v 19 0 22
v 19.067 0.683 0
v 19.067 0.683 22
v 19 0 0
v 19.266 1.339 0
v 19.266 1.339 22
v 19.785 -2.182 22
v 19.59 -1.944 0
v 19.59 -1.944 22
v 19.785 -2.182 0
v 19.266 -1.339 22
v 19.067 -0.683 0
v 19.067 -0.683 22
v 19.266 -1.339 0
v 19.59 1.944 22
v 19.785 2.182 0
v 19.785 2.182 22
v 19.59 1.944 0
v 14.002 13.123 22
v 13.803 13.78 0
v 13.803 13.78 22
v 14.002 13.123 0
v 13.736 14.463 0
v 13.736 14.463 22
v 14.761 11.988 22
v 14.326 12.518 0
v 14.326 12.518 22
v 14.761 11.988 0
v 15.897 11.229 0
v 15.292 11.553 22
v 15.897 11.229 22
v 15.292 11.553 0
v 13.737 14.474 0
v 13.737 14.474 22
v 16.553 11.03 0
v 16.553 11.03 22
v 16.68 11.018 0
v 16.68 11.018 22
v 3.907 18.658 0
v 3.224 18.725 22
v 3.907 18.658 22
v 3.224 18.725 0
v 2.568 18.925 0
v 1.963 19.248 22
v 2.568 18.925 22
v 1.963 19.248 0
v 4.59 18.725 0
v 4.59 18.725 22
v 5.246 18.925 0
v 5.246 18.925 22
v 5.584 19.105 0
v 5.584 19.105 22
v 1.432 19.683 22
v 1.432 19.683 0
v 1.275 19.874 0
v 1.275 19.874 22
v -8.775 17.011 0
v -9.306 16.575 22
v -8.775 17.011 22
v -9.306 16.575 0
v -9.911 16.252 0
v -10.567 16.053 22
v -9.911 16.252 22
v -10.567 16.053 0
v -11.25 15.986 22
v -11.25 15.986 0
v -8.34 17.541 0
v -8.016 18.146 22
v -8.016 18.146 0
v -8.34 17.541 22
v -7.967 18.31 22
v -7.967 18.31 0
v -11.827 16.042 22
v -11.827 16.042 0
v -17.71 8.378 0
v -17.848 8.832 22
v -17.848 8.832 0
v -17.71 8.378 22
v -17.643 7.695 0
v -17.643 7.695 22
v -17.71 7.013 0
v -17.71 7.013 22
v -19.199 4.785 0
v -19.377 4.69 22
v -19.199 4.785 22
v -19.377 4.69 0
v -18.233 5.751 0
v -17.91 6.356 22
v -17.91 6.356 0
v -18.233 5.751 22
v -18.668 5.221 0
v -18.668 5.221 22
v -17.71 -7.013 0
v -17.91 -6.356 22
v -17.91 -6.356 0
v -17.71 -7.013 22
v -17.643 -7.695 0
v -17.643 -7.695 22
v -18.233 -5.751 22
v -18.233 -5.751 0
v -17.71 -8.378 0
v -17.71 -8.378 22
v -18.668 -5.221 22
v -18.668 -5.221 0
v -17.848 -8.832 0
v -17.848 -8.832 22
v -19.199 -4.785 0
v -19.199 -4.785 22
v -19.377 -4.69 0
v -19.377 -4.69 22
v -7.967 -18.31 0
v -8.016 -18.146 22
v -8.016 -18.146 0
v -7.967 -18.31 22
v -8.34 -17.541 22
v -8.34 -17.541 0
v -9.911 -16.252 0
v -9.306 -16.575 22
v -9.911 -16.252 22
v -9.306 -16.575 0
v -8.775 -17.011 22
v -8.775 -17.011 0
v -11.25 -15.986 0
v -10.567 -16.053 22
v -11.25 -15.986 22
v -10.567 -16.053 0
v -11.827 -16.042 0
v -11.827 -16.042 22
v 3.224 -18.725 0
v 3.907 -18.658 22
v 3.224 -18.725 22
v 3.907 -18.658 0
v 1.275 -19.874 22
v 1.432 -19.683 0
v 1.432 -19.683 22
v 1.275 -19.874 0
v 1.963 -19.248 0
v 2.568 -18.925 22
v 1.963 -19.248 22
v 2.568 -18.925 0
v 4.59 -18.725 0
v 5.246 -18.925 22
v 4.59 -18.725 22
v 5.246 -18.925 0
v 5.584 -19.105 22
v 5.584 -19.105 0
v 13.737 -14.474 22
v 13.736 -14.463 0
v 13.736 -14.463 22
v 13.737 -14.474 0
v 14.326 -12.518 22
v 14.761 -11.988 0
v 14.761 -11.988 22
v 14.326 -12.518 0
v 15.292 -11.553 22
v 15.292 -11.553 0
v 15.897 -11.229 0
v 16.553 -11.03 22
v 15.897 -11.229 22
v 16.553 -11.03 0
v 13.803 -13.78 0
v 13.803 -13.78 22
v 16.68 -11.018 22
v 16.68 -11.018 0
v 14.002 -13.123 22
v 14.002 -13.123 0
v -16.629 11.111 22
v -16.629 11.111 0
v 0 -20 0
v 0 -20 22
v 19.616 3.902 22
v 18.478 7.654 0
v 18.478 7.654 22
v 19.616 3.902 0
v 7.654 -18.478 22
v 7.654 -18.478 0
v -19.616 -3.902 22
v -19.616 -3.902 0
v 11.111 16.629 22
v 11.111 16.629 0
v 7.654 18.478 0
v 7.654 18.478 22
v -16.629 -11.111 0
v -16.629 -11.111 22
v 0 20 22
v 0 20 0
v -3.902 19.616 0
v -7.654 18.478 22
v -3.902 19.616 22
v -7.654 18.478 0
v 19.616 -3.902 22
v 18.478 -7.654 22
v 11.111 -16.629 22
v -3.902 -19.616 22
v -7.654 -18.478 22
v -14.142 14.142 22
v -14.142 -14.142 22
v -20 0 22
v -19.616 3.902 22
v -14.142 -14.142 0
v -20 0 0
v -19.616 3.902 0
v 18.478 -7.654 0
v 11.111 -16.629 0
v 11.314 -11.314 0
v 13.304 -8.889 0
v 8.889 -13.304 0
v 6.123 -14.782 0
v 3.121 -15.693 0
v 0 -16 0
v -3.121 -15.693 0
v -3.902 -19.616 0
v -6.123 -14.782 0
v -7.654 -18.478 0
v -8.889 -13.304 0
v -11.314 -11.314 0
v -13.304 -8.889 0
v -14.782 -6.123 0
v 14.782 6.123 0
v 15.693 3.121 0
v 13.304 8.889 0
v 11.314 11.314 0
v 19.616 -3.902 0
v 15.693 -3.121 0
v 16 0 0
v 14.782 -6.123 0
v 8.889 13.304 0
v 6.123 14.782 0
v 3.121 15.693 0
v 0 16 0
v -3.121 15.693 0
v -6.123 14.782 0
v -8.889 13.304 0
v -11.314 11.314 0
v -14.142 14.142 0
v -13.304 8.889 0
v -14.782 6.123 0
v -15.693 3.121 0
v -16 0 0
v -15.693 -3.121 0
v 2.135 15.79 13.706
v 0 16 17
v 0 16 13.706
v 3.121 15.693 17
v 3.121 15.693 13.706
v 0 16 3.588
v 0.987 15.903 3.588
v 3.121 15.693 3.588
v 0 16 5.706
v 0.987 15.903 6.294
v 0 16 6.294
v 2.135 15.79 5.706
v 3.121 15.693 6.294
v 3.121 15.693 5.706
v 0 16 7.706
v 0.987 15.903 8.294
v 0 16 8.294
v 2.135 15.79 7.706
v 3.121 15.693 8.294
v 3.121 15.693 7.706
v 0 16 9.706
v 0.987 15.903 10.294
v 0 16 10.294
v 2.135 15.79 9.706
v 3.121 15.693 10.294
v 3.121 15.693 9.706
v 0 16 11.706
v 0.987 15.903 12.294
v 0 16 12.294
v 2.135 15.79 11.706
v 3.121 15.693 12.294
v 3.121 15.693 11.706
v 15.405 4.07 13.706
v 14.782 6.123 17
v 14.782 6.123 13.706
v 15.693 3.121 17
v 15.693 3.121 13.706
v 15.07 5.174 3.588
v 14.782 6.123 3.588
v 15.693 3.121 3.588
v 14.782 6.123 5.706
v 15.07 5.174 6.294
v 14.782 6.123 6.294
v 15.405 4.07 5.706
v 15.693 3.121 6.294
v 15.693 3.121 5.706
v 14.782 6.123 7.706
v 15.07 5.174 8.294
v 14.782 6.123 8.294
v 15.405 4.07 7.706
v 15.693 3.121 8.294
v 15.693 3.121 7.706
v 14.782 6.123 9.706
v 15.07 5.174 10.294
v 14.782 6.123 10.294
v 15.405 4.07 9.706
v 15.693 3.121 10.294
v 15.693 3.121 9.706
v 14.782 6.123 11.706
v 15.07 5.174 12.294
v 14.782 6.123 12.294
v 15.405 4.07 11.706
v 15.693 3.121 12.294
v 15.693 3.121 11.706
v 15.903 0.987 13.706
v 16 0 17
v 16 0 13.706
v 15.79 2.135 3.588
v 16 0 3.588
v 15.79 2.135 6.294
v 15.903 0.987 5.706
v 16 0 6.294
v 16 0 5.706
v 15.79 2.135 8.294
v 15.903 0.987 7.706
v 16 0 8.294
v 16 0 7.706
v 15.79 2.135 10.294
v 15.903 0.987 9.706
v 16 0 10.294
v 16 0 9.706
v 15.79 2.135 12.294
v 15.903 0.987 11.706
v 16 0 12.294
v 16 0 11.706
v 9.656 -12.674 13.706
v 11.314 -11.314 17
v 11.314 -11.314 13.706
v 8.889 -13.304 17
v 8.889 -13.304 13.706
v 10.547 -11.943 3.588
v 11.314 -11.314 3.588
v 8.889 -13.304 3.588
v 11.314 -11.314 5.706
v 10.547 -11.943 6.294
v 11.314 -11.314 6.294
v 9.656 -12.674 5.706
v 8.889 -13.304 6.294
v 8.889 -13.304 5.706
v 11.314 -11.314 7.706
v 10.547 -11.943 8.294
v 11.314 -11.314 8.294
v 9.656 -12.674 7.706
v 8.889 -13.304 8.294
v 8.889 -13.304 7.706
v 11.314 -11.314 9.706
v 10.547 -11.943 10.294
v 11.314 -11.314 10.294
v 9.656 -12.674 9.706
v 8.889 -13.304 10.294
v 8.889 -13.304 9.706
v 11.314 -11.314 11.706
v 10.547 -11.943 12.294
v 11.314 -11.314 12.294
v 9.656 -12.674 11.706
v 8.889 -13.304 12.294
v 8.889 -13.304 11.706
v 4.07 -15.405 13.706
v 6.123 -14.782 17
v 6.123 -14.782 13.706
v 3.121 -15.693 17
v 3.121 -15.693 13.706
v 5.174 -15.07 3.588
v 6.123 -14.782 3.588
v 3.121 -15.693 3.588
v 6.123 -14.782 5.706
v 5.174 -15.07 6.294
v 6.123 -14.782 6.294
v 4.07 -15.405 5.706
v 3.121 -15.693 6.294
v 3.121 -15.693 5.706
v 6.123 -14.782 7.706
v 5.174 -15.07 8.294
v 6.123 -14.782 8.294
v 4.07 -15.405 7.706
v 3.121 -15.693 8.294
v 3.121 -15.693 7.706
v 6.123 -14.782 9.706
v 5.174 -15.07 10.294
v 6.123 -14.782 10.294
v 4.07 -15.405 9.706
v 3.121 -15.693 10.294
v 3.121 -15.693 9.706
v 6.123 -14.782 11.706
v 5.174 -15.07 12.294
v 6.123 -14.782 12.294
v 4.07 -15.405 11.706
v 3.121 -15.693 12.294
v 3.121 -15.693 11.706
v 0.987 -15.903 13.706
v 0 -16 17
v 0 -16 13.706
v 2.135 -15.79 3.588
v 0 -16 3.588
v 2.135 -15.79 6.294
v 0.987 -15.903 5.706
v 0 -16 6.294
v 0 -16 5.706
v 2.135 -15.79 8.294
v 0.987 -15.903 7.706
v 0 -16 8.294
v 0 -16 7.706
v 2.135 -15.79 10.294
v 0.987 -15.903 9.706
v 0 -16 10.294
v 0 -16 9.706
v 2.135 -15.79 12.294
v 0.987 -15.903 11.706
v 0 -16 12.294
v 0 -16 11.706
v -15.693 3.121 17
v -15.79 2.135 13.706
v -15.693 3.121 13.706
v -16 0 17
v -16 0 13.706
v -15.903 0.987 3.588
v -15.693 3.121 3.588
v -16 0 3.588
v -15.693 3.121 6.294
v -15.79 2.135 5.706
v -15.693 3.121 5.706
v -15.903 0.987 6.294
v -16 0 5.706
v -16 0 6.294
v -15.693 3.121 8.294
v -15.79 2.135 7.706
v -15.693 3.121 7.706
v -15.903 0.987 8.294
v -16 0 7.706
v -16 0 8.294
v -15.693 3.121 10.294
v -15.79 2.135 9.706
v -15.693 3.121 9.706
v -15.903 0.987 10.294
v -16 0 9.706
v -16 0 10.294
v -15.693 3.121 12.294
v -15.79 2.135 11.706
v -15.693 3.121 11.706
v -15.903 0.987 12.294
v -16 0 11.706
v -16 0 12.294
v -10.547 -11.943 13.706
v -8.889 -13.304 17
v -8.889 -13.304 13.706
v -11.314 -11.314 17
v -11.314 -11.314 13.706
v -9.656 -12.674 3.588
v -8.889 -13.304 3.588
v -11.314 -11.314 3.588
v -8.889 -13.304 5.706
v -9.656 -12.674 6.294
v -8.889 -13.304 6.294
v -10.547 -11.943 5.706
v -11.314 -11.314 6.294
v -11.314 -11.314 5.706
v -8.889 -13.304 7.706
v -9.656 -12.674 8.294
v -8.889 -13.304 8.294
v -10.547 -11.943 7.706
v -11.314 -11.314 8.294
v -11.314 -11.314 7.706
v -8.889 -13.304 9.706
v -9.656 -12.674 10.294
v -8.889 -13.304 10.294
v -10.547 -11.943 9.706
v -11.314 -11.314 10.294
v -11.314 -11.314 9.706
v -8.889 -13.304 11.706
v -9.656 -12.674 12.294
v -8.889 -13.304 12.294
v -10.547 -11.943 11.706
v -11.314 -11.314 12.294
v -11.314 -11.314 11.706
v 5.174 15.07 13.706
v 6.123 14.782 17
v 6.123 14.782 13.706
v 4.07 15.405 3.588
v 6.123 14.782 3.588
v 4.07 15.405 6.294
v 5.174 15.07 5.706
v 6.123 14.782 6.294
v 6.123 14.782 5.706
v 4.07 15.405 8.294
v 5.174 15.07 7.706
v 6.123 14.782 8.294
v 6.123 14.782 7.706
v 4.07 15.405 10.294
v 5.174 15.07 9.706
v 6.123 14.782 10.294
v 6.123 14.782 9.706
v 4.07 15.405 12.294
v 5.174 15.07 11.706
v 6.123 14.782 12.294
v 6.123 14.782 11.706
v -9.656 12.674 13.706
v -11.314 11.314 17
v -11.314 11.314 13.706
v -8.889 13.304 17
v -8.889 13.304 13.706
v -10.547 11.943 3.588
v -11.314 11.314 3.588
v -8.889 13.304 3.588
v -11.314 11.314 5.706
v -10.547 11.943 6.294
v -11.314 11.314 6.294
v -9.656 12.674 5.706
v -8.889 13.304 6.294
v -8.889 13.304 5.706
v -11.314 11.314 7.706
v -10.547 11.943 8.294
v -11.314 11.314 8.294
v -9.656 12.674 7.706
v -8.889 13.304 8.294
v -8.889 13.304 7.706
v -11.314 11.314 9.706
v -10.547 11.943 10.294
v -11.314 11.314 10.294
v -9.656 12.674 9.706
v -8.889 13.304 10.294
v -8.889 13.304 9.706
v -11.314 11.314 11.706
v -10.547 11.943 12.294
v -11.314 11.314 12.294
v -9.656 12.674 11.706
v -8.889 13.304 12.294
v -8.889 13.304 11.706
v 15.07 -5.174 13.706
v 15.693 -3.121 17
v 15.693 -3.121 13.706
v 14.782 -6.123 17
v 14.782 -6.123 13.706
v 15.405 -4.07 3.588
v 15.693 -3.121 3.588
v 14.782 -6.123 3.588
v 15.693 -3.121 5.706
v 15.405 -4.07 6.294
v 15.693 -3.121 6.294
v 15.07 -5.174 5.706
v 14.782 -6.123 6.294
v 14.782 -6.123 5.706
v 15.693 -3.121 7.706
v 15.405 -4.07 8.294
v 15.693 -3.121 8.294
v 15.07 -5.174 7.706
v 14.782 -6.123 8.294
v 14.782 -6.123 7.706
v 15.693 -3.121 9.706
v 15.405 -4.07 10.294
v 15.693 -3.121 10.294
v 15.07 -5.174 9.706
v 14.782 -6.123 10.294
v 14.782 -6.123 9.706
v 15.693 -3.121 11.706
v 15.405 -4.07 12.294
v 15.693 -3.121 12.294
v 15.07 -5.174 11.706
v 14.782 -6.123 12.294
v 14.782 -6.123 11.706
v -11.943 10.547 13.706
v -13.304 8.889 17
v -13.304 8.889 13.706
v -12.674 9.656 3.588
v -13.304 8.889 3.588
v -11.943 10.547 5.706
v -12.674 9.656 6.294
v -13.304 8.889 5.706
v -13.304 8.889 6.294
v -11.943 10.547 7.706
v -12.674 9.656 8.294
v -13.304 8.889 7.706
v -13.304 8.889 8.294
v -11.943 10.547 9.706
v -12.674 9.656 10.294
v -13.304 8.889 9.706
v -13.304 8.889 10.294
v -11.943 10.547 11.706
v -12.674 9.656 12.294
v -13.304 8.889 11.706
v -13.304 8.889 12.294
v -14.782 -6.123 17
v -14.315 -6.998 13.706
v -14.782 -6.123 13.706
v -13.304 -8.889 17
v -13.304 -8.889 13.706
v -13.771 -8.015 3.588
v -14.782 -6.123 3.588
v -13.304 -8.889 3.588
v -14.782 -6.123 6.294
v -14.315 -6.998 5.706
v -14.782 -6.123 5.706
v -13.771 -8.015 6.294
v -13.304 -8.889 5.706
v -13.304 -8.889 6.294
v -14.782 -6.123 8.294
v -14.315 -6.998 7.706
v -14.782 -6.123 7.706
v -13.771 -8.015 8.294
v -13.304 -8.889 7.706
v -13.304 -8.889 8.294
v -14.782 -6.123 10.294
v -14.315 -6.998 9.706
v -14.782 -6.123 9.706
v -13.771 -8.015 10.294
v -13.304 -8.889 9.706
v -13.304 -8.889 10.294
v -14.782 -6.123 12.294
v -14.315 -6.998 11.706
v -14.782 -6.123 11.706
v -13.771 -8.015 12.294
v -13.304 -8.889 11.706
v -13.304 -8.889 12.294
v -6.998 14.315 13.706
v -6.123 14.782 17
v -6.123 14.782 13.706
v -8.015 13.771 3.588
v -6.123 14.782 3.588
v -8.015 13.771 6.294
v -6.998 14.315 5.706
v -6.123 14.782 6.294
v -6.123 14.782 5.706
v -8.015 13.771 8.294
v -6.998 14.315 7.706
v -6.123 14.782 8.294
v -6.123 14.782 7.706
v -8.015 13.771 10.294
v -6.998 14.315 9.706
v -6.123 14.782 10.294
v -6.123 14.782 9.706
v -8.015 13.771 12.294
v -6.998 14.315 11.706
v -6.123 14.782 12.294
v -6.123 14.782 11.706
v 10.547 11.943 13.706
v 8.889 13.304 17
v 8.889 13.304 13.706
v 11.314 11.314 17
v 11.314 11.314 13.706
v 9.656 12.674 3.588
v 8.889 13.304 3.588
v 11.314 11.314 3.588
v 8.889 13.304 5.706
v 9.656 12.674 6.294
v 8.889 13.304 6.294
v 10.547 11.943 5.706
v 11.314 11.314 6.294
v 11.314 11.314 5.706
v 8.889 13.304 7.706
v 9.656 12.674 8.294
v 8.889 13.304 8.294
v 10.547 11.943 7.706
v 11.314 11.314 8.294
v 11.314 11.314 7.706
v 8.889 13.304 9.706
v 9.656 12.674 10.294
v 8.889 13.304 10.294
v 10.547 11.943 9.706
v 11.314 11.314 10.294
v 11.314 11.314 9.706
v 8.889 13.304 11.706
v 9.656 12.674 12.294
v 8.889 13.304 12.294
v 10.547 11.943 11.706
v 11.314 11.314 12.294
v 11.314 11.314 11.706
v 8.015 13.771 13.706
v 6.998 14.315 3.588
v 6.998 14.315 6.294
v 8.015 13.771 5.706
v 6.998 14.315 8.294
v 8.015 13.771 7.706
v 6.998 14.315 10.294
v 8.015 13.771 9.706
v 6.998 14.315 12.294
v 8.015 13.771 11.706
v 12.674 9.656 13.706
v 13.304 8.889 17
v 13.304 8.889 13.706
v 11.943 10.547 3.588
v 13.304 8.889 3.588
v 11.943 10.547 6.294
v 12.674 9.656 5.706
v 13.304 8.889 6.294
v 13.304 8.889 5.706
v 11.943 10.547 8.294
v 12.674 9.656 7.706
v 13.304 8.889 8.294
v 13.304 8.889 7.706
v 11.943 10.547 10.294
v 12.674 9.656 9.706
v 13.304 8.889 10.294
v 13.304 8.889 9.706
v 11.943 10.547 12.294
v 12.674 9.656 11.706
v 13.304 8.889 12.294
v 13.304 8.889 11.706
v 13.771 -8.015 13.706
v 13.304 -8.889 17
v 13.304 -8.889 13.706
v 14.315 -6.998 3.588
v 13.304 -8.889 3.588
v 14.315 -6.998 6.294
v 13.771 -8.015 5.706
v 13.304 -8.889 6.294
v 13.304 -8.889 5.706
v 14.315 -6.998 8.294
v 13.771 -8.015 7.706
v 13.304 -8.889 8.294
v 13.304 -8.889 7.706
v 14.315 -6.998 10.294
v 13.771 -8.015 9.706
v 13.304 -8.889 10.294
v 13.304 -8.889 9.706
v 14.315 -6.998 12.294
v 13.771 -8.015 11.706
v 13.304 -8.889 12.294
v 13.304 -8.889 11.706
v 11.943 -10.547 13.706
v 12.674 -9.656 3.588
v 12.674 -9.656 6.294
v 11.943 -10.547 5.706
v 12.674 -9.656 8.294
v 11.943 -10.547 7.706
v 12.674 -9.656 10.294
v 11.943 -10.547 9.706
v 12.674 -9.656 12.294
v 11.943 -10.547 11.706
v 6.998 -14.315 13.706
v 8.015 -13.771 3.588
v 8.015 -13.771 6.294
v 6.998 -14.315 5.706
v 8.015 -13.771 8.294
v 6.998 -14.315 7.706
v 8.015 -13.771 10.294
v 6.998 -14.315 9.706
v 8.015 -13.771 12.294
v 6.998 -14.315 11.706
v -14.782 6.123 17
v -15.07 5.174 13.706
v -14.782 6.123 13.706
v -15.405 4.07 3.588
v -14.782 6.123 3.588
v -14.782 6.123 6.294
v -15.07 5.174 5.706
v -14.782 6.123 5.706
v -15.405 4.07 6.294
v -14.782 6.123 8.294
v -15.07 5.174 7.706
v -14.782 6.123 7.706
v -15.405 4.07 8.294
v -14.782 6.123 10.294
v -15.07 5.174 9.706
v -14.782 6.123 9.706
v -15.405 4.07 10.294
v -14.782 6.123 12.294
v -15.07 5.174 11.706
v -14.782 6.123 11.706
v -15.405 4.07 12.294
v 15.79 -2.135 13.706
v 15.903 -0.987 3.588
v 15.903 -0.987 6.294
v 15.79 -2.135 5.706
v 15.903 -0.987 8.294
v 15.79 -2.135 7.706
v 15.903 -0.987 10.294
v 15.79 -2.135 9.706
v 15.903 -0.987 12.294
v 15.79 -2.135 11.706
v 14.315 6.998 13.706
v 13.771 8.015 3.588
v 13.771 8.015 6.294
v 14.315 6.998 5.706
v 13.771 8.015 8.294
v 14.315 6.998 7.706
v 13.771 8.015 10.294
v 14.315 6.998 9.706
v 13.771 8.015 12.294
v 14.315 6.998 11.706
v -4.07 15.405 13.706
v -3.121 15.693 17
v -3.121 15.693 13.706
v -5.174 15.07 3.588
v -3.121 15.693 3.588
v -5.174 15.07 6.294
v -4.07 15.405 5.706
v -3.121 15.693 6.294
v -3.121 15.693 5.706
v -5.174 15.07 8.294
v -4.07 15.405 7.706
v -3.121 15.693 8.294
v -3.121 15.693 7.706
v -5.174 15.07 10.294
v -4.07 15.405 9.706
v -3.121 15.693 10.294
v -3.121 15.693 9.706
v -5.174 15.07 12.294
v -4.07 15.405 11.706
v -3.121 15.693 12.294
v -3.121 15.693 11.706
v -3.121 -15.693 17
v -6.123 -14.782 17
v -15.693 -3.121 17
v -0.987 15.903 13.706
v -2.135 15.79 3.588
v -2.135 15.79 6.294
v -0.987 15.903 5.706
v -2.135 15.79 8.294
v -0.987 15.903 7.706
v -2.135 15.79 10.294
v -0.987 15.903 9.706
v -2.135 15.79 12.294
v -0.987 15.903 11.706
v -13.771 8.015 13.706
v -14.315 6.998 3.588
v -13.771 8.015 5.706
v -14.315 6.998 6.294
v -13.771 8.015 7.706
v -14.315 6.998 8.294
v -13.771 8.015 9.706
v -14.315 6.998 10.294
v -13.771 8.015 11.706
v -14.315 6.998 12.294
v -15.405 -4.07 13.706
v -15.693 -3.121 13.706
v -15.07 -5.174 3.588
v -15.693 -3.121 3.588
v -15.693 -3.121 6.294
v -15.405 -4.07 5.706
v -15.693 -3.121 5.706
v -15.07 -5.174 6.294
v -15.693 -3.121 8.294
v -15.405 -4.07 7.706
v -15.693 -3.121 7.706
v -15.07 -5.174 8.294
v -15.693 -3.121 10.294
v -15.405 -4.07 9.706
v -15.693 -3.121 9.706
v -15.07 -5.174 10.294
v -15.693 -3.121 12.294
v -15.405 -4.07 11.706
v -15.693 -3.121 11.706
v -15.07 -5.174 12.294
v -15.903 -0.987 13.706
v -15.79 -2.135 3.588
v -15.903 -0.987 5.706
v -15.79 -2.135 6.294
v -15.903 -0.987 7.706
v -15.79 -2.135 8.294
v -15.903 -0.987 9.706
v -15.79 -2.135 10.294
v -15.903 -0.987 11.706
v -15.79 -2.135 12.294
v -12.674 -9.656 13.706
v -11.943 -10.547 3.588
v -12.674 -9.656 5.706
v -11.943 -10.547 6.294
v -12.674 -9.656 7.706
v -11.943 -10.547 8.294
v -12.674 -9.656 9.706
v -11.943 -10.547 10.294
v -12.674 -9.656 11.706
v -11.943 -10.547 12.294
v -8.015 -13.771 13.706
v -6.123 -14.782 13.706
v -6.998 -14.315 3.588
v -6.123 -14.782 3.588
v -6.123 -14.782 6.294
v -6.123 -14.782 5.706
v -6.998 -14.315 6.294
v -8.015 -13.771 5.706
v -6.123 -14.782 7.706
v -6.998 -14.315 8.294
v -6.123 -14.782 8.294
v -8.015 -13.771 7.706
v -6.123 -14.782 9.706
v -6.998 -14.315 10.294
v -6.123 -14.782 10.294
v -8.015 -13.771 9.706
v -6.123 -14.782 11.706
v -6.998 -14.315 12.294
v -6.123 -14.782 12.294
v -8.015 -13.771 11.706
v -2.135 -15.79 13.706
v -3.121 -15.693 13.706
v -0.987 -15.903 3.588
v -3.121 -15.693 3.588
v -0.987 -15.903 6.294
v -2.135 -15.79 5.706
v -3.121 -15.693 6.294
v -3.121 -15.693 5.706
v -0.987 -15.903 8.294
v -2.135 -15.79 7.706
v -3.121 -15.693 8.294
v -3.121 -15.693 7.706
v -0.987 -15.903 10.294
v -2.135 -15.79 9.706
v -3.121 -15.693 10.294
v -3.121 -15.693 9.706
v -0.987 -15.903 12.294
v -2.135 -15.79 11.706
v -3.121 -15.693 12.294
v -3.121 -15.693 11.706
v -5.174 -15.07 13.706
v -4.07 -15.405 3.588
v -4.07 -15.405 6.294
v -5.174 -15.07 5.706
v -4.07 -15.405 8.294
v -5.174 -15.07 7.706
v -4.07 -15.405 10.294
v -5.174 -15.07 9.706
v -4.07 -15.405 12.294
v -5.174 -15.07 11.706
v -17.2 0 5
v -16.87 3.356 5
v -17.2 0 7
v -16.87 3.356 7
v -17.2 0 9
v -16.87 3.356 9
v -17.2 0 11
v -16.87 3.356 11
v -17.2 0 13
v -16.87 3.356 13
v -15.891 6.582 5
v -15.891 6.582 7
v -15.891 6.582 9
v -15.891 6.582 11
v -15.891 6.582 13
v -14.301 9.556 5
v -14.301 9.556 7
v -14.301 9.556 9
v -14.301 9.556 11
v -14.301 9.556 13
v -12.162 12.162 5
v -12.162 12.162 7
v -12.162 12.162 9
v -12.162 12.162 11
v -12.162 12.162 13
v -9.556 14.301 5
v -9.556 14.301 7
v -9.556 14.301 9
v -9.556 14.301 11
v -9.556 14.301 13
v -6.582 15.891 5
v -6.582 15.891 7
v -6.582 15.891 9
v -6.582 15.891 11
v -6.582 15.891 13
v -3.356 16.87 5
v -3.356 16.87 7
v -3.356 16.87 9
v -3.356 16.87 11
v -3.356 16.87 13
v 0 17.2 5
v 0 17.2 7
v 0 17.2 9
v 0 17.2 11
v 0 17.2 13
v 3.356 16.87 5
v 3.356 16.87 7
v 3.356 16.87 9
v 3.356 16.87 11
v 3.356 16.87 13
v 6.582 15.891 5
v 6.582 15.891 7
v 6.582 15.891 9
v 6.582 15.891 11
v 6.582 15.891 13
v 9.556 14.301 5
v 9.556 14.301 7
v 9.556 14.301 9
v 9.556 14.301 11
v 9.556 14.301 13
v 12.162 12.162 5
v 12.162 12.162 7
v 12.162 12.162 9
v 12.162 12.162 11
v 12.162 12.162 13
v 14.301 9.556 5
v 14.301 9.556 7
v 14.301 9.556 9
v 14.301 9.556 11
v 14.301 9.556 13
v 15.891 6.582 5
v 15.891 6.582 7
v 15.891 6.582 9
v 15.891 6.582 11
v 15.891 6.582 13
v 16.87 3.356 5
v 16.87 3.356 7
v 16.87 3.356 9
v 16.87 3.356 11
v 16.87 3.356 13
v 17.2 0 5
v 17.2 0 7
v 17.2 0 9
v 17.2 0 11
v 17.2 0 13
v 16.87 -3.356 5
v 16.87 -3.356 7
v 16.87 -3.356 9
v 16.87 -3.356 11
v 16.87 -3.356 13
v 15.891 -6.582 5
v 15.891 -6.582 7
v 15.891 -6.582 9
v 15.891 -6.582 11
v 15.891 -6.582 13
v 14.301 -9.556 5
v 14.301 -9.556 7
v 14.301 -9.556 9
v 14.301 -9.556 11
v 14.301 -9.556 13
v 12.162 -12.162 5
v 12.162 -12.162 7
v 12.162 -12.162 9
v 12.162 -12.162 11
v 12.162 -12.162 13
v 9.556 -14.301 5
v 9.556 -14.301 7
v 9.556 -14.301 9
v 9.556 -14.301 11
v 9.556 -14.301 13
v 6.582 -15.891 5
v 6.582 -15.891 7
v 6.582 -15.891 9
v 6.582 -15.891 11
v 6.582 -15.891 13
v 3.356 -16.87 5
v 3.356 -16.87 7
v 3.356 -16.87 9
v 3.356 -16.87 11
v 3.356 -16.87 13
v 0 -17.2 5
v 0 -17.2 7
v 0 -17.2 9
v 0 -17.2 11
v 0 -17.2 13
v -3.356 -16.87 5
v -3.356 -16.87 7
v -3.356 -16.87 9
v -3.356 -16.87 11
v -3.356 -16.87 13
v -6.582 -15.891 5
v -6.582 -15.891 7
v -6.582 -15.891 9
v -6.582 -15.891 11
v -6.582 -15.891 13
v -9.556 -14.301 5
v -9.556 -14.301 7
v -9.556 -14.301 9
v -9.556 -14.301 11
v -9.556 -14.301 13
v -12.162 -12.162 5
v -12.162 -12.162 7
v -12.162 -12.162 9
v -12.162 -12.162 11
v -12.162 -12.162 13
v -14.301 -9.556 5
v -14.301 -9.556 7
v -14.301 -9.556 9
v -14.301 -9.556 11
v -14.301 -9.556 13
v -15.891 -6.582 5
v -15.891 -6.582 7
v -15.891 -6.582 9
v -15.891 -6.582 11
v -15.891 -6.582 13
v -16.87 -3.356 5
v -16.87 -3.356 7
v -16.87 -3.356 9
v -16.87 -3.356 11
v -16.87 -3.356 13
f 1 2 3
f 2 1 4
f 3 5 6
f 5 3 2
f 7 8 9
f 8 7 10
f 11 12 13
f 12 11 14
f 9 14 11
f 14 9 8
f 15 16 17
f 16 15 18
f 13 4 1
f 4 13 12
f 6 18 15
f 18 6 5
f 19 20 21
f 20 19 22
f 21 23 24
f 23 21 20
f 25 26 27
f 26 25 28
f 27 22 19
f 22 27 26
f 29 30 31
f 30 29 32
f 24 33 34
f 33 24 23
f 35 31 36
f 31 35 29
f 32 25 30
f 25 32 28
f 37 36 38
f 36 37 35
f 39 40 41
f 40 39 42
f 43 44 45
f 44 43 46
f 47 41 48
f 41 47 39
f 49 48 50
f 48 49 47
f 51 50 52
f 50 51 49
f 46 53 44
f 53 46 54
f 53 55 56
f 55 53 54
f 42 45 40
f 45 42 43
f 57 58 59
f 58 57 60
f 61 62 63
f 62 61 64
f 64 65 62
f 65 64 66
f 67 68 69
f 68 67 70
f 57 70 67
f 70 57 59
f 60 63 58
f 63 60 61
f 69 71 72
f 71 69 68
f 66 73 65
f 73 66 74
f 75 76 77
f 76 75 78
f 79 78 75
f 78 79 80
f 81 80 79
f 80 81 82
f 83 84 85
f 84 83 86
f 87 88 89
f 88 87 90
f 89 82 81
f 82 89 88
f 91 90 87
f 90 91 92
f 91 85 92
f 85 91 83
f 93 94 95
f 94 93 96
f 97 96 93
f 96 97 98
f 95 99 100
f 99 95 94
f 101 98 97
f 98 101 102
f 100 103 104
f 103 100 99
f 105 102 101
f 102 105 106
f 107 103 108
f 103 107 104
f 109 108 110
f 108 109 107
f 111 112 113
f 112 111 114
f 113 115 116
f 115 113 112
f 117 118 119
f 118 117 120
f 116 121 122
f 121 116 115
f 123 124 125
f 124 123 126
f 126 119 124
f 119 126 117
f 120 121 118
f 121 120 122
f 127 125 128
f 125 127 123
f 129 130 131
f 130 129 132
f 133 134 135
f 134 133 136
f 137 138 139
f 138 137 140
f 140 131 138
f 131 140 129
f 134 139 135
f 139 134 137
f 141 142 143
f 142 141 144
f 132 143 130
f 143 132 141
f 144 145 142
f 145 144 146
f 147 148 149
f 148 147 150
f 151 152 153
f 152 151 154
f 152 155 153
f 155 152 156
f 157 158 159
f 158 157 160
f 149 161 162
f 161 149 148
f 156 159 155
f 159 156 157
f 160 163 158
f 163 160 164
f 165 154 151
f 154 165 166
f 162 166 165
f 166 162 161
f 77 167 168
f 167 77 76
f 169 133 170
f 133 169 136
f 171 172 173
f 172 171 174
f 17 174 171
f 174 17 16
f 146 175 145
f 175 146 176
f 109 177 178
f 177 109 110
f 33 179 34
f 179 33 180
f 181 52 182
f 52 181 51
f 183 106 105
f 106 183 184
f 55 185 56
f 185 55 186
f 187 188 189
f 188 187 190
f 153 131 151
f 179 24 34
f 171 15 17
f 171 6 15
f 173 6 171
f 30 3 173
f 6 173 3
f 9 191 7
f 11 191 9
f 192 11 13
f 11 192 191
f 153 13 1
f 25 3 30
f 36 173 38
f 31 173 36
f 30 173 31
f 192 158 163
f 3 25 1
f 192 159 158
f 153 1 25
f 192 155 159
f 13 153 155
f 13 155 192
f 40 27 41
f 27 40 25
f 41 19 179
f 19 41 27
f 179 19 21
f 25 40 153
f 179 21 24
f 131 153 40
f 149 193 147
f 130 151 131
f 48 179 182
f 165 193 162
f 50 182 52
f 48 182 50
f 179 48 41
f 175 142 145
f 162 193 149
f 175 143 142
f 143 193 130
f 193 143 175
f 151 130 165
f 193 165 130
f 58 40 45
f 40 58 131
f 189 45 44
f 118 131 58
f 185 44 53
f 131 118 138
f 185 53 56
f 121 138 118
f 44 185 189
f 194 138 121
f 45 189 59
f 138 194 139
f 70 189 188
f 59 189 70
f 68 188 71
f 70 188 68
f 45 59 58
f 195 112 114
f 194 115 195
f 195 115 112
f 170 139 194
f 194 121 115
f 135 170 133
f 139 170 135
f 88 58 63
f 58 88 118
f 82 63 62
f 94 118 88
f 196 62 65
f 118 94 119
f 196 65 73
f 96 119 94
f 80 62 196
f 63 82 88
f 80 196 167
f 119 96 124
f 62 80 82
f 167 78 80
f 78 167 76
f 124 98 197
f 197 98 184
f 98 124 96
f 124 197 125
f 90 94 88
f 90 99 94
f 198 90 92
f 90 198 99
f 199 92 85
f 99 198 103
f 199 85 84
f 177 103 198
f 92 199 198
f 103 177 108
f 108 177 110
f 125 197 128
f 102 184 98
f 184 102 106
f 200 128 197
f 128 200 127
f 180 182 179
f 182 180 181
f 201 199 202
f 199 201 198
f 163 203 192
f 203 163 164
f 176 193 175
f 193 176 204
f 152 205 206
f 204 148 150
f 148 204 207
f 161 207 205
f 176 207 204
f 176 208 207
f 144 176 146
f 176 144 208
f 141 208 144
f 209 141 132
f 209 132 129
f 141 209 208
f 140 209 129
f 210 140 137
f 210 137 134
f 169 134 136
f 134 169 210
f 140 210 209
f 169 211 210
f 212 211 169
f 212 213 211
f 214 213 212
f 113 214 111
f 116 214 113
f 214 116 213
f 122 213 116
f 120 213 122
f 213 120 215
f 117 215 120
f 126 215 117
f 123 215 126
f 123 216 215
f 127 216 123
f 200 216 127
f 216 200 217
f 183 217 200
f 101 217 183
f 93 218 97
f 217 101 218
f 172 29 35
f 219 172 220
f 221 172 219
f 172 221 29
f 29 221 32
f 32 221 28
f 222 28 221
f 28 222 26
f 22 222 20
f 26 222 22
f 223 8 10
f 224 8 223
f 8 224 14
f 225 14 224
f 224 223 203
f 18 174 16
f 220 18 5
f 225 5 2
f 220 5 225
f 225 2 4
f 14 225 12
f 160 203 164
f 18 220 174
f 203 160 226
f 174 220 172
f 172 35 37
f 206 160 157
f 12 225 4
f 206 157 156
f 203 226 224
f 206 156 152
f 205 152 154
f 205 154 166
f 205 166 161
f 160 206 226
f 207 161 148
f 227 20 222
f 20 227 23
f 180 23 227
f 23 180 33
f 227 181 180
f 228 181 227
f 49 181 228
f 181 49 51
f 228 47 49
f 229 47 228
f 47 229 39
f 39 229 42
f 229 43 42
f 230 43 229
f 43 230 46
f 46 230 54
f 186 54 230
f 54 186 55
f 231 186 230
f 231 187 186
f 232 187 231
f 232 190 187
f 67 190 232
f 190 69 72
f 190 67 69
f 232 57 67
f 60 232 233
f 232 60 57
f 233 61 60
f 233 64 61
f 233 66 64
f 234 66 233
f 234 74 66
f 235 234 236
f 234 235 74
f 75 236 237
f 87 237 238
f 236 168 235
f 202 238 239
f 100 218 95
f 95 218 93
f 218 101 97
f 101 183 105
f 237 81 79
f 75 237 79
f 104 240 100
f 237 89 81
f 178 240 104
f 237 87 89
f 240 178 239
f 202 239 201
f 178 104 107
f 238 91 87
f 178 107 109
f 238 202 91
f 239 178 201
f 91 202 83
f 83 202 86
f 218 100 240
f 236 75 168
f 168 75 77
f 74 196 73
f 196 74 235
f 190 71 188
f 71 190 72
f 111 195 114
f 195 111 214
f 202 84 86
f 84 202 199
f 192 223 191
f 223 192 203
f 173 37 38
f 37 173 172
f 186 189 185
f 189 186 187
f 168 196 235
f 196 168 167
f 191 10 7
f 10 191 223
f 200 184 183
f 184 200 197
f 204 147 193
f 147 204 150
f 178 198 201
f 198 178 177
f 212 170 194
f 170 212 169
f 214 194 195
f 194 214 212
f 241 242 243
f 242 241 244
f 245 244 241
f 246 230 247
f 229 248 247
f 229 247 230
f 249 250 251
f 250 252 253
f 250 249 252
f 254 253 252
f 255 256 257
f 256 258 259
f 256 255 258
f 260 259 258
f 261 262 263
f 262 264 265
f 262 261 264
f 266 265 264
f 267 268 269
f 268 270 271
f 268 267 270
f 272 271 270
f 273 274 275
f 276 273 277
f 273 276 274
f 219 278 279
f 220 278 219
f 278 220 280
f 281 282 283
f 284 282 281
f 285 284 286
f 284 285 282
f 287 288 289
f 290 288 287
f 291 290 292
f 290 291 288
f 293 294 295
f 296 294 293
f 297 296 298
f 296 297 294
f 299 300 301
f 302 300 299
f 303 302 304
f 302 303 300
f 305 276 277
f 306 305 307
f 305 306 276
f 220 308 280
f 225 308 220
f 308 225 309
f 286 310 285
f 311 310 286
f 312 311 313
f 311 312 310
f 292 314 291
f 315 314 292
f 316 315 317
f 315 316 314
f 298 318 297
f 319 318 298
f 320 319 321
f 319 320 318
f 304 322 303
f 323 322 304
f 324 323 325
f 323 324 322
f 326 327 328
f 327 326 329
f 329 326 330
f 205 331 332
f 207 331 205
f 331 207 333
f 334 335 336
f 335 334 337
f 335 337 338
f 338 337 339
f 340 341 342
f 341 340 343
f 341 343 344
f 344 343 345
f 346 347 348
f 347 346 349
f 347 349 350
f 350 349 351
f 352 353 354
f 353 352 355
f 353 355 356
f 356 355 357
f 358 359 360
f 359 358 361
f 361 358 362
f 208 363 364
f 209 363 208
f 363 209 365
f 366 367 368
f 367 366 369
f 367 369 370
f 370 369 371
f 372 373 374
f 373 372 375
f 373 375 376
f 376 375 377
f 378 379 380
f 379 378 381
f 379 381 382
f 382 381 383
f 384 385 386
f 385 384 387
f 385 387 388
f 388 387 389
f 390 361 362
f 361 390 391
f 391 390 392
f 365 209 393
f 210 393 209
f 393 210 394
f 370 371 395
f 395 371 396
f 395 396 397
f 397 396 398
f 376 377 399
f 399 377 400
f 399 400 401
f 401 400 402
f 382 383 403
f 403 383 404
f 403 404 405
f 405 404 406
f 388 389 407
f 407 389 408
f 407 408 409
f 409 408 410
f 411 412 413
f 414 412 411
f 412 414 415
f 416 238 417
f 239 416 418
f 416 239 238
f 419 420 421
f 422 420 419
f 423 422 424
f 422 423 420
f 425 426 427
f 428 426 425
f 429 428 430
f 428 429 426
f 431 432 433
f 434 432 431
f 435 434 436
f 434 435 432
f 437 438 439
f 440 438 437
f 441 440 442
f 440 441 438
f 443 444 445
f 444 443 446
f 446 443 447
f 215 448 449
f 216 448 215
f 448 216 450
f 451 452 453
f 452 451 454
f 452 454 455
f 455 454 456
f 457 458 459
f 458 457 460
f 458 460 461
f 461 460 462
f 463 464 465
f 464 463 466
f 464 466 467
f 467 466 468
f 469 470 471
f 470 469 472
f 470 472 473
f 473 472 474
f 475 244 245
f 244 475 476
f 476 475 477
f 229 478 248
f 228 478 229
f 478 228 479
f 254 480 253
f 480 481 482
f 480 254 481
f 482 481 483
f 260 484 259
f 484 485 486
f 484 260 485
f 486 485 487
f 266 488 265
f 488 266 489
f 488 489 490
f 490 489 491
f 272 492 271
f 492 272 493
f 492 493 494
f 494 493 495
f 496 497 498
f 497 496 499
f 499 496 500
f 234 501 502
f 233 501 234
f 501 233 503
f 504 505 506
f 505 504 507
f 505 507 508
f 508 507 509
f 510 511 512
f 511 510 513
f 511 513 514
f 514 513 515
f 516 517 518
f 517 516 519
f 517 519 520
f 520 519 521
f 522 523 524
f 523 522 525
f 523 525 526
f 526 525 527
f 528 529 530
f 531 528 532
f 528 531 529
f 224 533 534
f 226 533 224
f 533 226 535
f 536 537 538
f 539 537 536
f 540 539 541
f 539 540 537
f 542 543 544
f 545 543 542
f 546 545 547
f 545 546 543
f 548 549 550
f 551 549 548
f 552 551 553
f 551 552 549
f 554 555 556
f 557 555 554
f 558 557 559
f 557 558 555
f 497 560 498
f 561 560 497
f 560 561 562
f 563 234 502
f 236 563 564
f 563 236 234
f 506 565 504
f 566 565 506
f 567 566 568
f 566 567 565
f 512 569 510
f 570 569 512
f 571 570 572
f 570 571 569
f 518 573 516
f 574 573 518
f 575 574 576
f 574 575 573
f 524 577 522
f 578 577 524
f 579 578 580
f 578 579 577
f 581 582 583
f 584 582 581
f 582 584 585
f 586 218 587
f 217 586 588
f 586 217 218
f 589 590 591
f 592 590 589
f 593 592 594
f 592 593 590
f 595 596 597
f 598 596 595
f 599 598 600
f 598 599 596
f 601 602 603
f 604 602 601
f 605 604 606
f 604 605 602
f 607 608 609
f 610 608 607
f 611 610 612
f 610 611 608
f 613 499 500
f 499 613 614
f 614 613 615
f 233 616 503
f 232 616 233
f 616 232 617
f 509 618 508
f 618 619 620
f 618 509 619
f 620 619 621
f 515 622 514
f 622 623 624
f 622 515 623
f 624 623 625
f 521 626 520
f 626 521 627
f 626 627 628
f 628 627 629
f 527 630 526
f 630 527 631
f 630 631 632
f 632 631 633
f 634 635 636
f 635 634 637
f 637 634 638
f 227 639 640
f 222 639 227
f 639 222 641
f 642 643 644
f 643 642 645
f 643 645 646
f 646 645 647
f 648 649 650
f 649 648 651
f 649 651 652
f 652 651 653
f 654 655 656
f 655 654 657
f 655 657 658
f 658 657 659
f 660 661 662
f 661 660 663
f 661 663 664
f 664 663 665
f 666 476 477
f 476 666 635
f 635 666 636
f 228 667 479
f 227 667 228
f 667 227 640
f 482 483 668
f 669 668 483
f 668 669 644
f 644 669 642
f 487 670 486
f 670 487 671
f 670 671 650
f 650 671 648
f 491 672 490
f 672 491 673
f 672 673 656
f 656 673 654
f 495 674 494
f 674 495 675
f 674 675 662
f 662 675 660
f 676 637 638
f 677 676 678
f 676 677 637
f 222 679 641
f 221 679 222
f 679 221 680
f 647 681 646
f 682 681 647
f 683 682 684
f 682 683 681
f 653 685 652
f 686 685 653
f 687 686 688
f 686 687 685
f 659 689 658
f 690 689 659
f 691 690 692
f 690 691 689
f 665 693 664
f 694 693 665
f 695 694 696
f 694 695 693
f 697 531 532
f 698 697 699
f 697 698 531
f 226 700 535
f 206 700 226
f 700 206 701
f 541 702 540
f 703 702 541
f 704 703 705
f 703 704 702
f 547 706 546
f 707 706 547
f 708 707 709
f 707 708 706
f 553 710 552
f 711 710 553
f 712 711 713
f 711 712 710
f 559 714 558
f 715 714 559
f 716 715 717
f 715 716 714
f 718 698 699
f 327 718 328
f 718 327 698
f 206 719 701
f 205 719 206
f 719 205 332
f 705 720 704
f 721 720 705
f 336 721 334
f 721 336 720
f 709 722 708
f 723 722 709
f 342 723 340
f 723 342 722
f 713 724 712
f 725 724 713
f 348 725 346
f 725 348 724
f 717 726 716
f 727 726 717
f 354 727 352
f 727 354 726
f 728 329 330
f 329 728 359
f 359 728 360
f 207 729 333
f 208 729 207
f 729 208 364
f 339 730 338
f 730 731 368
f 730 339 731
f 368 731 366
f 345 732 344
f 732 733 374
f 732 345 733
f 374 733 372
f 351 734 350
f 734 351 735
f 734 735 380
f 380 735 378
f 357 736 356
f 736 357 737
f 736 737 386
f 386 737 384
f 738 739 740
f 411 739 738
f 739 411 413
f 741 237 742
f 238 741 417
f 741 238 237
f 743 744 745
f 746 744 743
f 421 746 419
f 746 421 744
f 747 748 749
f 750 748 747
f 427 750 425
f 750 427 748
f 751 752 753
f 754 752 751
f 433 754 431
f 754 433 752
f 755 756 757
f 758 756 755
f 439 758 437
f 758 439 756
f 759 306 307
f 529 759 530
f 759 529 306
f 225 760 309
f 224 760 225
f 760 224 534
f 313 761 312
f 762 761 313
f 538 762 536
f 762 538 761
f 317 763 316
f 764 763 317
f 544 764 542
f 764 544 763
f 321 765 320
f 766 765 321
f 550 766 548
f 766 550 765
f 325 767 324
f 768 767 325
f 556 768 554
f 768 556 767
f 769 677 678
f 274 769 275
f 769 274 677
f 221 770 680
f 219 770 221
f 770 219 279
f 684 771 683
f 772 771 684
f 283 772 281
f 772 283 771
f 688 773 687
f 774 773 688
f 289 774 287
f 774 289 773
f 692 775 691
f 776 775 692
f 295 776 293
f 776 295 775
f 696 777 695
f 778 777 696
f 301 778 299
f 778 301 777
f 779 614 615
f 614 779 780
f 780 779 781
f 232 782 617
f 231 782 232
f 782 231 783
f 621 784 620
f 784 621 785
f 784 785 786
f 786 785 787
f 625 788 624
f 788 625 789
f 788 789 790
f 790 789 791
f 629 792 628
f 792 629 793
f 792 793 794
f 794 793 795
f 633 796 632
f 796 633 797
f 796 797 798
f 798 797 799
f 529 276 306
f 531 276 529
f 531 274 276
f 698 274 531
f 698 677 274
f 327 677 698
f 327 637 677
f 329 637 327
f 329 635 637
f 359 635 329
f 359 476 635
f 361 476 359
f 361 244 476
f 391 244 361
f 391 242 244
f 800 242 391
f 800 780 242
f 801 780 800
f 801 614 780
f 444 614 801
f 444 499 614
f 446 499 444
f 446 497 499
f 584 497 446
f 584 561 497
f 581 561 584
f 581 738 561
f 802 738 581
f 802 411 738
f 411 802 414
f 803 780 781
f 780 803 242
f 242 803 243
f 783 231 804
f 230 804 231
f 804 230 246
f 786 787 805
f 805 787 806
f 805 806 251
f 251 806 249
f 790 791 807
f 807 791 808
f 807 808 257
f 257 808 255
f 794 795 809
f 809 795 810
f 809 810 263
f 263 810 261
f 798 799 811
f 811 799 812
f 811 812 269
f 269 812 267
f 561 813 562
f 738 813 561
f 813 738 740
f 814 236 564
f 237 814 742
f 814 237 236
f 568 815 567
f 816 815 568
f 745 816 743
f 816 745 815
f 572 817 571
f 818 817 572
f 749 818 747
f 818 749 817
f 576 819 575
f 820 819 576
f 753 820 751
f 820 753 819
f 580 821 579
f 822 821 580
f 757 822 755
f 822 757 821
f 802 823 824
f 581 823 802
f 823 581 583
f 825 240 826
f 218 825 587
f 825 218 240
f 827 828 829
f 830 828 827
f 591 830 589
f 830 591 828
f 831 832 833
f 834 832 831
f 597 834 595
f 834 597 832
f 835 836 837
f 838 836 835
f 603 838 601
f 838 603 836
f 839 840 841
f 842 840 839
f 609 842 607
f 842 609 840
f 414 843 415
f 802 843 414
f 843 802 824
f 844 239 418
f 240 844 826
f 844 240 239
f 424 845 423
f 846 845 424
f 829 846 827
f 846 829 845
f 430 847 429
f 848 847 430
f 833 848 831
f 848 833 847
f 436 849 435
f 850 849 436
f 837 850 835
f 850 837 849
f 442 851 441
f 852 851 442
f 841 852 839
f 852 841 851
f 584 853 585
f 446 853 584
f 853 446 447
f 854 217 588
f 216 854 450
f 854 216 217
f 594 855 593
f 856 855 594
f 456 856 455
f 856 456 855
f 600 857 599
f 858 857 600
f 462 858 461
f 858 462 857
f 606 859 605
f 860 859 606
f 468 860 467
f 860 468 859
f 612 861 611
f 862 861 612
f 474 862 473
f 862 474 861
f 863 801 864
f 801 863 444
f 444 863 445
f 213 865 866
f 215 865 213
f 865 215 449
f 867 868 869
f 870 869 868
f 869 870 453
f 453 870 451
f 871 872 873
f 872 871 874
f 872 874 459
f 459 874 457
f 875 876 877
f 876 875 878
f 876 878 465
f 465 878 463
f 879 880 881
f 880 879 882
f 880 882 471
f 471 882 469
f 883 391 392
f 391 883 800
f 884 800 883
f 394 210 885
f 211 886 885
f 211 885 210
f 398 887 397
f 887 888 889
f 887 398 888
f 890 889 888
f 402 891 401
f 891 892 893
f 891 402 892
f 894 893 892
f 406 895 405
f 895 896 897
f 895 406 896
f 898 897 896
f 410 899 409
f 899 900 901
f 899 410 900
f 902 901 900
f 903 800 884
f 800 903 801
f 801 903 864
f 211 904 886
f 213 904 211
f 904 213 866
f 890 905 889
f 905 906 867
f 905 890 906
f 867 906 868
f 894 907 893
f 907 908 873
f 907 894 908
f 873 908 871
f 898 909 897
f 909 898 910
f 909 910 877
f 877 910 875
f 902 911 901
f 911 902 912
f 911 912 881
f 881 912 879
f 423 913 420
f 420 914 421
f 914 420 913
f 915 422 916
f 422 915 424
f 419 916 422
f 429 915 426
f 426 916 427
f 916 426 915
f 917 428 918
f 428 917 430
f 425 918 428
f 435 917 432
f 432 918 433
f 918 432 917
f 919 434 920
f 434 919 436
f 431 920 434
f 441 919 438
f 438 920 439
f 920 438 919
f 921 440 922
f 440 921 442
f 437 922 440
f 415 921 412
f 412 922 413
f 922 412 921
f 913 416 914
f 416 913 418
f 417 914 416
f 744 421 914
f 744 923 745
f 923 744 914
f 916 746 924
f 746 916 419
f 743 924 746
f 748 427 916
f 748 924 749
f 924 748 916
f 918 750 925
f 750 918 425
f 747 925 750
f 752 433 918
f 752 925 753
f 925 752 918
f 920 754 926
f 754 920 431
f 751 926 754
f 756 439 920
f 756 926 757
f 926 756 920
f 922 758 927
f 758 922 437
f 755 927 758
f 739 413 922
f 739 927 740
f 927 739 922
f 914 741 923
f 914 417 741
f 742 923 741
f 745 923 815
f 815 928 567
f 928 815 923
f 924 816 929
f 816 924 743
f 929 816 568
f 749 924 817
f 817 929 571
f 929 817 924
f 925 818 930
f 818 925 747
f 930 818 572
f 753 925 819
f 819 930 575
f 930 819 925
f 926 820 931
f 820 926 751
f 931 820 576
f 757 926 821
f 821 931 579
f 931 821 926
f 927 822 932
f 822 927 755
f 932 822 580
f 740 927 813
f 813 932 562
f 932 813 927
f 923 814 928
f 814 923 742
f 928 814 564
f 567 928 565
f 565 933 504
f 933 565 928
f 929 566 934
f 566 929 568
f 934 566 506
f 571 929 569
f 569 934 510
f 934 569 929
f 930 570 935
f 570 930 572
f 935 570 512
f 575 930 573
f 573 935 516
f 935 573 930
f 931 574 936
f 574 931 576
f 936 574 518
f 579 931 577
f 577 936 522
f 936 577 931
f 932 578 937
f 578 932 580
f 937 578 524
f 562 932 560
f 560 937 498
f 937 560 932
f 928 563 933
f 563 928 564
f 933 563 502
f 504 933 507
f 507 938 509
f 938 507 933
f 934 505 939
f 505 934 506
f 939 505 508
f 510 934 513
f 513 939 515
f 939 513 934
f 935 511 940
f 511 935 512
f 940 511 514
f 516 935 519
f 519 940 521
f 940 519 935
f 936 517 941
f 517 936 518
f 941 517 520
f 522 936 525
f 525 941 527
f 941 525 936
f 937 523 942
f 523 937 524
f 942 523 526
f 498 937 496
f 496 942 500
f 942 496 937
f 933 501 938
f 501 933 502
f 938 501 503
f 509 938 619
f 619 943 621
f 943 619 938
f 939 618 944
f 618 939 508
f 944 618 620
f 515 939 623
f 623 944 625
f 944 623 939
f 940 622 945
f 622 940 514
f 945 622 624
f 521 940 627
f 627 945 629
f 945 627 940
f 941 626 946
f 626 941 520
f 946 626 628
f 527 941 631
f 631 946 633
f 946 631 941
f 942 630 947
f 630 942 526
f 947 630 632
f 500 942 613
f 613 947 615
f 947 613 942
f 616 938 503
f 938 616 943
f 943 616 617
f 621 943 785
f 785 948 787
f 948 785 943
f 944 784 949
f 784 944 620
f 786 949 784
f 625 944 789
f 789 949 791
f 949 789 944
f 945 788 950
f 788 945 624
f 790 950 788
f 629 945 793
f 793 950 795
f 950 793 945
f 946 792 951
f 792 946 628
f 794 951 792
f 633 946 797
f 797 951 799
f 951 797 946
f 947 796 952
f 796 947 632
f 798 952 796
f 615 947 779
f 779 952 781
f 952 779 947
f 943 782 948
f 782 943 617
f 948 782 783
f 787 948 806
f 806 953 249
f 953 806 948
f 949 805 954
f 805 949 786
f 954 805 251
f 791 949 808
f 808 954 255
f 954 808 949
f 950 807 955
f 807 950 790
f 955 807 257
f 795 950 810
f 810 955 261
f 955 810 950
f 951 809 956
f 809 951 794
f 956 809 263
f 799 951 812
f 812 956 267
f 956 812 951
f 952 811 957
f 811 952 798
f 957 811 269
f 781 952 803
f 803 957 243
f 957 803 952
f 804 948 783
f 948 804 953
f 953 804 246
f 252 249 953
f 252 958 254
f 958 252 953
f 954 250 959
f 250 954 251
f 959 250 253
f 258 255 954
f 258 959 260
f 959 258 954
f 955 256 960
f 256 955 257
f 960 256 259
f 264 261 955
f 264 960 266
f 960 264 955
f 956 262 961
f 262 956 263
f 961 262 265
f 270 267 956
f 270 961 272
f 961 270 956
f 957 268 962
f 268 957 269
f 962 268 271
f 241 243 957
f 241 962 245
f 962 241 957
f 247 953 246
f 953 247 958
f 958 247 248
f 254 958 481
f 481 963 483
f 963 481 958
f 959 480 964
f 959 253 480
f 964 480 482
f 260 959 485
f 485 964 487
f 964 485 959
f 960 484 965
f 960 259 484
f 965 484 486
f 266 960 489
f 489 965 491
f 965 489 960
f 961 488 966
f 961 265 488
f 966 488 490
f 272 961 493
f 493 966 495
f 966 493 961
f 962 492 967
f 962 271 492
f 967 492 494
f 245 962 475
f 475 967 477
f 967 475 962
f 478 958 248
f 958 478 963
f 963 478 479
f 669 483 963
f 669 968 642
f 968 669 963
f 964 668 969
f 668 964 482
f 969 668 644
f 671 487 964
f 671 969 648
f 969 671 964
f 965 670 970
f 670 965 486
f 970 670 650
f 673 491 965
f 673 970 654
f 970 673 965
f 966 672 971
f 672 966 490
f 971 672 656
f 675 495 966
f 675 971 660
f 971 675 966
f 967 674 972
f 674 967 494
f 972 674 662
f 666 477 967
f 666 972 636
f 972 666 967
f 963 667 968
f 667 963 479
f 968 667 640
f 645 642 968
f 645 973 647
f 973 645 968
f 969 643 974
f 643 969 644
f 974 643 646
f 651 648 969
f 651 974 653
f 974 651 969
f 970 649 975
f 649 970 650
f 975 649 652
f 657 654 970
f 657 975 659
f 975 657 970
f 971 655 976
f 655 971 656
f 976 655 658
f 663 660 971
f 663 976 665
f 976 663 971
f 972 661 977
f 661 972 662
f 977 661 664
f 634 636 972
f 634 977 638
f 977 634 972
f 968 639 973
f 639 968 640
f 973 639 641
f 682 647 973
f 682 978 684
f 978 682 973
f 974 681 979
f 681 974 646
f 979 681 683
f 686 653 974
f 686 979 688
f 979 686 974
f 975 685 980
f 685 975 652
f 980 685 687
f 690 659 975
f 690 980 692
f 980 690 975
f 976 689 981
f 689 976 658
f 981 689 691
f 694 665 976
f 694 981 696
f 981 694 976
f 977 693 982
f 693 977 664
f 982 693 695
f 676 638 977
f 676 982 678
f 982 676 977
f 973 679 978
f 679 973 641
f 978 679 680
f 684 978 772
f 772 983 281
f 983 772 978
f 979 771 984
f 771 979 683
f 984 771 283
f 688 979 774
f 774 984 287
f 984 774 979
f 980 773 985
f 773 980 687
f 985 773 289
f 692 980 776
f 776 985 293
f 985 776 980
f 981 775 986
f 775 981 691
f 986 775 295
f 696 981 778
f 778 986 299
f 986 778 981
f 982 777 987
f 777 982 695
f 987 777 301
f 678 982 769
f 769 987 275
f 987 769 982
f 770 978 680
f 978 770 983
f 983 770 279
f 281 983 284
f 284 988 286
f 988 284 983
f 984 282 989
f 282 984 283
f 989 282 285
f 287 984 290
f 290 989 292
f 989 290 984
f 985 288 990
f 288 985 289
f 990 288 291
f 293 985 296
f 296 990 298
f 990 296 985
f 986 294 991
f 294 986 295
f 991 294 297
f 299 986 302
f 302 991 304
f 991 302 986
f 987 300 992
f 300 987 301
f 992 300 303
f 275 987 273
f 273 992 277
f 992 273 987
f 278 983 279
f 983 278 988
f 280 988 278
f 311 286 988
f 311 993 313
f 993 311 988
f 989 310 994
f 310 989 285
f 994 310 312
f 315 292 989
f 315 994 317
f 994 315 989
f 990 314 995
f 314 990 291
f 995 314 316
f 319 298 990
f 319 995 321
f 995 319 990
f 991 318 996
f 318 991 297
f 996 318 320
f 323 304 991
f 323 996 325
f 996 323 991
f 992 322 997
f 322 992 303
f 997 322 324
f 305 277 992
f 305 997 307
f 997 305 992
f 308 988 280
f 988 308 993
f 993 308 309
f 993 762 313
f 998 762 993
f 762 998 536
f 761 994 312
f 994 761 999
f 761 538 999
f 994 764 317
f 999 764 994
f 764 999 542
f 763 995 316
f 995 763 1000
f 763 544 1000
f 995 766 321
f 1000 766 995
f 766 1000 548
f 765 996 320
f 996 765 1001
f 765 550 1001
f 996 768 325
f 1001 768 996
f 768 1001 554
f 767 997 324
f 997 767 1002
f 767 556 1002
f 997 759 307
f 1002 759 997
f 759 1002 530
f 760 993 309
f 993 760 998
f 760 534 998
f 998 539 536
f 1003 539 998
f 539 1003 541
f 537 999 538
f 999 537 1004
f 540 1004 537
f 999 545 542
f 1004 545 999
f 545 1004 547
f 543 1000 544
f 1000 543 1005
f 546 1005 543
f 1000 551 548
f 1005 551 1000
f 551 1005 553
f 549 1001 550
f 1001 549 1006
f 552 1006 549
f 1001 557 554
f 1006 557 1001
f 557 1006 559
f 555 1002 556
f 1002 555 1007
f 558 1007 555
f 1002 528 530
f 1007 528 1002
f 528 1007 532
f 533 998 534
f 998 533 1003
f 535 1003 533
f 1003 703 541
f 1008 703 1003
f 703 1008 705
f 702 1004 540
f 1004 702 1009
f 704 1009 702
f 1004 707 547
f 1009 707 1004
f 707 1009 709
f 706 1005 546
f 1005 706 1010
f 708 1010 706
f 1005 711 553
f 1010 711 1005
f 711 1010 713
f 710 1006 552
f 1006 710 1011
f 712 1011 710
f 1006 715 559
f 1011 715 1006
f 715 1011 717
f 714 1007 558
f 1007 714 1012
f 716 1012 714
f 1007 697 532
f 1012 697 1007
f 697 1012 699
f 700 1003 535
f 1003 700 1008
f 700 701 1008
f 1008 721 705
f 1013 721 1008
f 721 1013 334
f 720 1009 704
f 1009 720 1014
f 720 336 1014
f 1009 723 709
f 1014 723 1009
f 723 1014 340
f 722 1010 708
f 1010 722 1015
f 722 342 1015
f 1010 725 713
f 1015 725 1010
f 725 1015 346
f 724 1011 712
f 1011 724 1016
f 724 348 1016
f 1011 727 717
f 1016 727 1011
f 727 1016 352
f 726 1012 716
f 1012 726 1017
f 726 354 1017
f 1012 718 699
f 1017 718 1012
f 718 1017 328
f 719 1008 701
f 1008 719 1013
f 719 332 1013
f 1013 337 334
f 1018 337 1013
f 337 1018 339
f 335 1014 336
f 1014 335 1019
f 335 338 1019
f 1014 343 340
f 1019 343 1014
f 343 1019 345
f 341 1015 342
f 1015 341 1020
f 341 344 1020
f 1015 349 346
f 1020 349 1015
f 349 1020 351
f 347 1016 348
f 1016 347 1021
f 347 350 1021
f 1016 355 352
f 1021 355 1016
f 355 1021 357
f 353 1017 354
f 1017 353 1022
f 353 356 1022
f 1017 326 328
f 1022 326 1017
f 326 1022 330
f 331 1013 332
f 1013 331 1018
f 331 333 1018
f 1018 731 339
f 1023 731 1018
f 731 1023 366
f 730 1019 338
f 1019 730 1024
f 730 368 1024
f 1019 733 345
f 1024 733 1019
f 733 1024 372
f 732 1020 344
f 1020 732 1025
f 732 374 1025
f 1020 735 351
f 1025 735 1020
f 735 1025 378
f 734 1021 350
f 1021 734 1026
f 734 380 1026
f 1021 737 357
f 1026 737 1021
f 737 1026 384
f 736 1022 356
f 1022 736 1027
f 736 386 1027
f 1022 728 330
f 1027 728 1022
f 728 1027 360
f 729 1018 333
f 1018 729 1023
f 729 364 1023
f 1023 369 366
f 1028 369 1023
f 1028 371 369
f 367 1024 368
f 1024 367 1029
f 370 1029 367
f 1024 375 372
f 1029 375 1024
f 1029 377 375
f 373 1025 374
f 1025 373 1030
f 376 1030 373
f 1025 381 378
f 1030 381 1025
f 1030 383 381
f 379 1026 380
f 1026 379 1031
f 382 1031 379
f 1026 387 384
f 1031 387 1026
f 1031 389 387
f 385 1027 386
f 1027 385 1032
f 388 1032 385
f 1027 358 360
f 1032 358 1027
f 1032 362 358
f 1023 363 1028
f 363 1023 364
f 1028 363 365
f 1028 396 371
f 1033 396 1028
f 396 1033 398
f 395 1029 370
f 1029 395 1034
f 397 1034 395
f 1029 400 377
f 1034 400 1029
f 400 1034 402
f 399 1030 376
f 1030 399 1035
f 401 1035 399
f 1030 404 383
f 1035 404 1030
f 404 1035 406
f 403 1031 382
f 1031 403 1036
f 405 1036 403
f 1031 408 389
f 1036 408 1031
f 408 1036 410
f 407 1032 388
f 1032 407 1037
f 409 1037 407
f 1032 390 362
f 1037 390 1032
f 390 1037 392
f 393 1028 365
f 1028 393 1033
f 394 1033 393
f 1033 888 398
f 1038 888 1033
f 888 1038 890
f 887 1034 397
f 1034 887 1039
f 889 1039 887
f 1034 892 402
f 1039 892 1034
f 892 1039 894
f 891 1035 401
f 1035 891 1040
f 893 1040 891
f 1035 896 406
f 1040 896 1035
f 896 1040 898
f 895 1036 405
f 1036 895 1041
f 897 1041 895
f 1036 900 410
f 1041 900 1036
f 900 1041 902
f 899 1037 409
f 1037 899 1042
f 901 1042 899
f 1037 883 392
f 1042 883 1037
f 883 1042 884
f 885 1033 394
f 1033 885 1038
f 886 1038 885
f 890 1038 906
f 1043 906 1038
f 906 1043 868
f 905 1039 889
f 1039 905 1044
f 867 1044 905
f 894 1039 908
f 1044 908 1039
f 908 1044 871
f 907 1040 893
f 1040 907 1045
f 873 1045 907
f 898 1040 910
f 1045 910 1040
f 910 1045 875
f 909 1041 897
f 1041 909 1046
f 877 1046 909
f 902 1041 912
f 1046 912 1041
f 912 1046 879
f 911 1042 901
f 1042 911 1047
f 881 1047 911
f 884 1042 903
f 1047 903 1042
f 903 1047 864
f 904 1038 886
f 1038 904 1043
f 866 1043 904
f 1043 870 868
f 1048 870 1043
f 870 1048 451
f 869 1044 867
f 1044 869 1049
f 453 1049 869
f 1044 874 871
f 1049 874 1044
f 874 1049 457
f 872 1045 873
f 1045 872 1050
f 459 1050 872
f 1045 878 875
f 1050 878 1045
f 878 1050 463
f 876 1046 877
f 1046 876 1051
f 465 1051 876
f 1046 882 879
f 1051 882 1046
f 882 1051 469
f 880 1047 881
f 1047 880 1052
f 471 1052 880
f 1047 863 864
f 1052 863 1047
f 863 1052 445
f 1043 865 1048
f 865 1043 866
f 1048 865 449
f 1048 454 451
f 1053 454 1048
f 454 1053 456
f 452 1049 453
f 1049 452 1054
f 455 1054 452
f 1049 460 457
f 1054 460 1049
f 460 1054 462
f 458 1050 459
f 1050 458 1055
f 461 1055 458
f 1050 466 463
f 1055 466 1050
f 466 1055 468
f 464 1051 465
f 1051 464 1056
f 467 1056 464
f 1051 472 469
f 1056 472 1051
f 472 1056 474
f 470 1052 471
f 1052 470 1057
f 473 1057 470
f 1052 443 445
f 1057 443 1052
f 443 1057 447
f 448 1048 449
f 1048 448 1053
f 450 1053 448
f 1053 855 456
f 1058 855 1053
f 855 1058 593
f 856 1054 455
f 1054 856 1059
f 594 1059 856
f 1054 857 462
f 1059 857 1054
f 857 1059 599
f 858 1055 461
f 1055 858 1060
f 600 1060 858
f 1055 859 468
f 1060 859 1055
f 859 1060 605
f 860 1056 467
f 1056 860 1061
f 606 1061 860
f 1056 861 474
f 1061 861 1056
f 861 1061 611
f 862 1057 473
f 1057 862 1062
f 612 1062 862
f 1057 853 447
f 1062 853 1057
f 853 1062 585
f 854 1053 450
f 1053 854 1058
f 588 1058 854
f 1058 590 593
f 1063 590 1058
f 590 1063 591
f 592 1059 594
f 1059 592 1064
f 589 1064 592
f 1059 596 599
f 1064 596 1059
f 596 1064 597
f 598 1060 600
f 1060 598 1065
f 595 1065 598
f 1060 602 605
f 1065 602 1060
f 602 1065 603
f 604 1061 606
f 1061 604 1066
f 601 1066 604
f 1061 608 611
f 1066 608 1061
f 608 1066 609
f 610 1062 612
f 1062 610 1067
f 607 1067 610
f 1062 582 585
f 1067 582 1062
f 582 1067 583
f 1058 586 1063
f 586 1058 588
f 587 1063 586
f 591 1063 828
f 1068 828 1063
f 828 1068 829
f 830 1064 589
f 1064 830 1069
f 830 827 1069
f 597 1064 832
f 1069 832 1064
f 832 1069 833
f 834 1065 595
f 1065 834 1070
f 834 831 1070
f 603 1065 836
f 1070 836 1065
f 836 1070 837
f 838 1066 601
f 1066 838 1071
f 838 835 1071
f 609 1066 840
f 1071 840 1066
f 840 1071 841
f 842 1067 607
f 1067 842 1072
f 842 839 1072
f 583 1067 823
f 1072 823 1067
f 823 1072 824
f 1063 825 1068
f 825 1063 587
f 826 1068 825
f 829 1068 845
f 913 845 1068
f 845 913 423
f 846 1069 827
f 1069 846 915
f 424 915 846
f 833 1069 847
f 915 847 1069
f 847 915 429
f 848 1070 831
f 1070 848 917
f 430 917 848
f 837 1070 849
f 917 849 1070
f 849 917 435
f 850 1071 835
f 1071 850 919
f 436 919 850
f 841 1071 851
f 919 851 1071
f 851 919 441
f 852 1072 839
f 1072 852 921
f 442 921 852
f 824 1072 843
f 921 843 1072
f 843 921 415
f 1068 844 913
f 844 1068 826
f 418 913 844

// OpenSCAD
$fn = 32;

// ----------------------------------------------------------------------
// Threaded cap: 40 mm body, 22 mm tall, 32 mm threaded bore
// ----------------------------------------------------------------------

// --- parameters (mm) ---
outer_d = 40;             // cap outside diameter
body_h = 22;              // cap height
top_t = 5;                // closed top thickness
bore_d = 32;              // bore core diameter
pitch = 2;                // thread pitch
thread_d = 1.2;           // thread depth
thread_z = 3;             // thread start above the rim
thread_h = 11;            // threaded height
flutes = 9;               // number of knurl flutes
flute_d = 7;              // flute cutter diameter
flute_depth = 1;          // flute depth into the rim

difference() {
  union() {
    cylinder(h = 22, d = outer_d);
  }
  /* threaded bore, closed at the top */
  translate([0, 0, -2.5]) cylinder(h = 19.5, d = bore_d);
  translate([0, 0, 3]) rotate_extrude() polygon([[15, 0], [15, 11], [15.5, 11], [17.2, 10], [15.5, 9], [17.2, 8], [15.5, 7], [17.2, 6], [15.5, 5], [17.2, 4], [15.5, 3], [17.2, 2], [15.5, 0], [15, 0]]);
  /* knurl flutes around the rim */
  for (i = [0 : flutes - 1]) {
    a = i * 360 / flutes;
    translate([(outer_d / 2 + flute_d / 2 - flute_depth) * cos(a), (outer_d / 2 + flute_d / 2 - flute_depth) * sin(a), -2.5]) cylinder(h = body_h + 5, d = flute_d);
  }
}
